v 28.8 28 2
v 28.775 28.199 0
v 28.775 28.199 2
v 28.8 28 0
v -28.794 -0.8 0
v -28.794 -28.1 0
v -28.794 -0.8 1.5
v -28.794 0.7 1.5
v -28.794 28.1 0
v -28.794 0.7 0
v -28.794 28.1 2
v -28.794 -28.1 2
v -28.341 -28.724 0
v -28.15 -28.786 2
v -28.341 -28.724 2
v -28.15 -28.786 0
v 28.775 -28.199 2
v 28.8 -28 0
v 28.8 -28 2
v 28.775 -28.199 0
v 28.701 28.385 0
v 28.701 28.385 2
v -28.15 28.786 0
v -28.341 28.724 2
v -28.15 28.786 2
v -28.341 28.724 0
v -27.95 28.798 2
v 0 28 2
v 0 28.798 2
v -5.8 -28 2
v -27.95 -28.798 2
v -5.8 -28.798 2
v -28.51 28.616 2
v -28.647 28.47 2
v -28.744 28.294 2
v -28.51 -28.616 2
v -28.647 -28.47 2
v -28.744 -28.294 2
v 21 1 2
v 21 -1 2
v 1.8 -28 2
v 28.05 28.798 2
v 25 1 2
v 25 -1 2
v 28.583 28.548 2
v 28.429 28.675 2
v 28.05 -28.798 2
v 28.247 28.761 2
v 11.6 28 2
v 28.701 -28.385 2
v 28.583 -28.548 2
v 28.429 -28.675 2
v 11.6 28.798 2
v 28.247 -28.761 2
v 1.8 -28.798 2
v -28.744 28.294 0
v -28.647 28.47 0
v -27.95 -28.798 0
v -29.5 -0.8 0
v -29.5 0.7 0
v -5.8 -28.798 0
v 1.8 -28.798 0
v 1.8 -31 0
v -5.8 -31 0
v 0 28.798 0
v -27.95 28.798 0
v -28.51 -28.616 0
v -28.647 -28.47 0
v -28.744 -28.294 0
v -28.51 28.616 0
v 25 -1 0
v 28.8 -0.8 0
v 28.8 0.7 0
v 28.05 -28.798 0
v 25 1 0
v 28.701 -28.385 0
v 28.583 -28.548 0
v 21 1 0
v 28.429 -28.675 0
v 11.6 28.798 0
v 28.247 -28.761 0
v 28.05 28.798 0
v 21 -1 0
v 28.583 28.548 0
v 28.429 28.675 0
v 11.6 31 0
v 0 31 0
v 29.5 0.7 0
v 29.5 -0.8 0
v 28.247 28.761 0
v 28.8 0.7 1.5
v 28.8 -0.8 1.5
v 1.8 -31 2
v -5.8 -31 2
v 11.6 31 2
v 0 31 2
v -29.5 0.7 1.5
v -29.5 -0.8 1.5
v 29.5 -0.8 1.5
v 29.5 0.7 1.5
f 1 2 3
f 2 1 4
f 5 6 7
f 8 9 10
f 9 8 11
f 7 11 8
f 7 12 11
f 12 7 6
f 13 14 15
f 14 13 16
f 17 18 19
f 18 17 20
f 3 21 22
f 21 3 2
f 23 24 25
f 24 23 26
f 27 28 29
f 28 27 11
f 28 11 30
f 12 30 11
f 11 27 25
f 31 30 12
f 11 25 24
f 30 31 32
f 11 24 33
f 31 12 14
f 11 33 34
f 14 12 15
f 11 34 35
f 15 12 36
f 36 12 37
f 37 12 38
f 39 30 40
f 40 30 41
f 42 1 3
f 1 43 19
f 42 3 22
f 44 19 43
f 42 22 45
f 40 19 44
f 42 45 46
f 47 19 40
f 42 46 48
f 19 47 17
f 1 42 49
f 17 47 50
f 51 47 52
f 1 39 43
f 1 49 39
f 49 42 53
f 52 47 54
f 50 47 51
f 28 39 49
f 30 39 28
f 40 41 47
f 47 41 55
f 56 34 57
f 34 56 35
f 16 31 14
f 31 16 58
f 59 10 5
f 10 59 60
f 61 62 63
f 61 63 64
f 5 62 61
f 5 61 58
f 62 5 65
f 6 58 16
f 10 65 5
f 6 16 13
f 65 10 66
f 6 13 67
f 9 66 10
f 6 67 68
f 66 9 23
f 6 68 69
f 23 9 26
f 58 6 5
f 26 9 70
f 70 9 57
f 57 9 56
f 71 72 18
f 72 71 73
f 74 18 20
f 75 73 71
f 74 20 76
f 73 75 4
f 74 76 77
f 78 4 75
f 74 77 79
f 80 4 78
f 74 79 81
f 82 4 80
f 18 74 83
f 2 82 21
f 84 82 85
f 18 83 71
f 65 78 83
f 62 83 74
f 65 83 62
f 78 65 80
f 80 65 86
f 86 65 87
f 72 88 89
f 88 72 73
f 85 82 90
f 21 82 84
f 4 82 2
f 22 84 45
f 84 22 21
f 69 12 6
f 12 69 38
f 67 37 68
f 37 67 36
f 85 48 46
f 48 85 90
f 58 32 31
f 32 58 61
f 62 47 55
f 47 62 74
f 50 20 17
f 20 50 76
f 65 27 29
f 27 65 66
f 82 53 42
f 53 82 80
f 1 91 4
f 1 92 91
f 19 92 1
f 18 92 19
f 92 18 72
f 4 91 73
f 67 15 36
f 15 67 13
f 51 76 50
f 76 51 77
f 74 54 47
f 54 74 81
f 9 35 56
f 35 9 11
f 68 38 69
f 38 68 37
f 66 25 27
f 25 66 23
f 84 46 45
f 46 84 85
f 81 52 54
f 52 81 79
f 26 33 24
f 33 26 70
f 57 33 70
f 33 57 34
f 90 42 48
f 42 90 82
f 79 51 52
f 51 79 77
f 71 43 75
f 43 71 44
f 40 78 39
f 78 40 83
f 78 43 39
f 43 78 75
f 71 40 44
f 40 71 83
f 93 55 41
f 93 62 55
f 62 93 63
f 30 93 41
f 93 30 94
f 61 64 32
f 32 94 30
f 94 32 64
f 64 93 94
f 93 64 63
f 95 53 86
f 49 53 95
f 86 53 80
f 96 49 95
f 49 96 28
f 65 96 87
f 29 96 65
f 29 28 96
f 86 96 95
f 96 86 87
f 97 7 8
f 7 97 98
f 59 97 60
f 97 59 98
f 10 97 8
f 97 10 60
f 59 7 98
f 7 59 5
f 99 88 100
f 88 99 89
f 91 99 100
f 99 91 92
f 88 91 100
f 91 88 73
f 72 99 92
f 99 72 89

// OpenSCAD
// Krabicka Ivan víčko

// rozměry v mm
s = 56;  // sirka
d = 56;  // delka
v = 1.9; // vyska

module
vicko()

    difference()
{
    $fn = 25;
    minkowski()
    {
        translate([ -d / 2, -s / 2, 0 ]) cube([ d, s, v ]);
        cylinder(r = 0.8, h = 0.1); // zaoblení rohů
    }
    translate([ 21, -1, -0.7 ]) // díra
        cube([ 4, 2, 3 ]);
}
translate([ -5.8, -31, 0 ]) // zámky
    cube([ 7.6, 3, 2 ]);
translate([ -0, 28, 0 ]) cube([ 11.6, 3, 2 ]);

translate([ -29.5, -0.8, 0 ]) cube([ 2, 1.5, 1.5 ]);
translate([ 27.5, -0.8, 0 ]) cube([ 2, 1.5, 1.5 ]);
vicko();
